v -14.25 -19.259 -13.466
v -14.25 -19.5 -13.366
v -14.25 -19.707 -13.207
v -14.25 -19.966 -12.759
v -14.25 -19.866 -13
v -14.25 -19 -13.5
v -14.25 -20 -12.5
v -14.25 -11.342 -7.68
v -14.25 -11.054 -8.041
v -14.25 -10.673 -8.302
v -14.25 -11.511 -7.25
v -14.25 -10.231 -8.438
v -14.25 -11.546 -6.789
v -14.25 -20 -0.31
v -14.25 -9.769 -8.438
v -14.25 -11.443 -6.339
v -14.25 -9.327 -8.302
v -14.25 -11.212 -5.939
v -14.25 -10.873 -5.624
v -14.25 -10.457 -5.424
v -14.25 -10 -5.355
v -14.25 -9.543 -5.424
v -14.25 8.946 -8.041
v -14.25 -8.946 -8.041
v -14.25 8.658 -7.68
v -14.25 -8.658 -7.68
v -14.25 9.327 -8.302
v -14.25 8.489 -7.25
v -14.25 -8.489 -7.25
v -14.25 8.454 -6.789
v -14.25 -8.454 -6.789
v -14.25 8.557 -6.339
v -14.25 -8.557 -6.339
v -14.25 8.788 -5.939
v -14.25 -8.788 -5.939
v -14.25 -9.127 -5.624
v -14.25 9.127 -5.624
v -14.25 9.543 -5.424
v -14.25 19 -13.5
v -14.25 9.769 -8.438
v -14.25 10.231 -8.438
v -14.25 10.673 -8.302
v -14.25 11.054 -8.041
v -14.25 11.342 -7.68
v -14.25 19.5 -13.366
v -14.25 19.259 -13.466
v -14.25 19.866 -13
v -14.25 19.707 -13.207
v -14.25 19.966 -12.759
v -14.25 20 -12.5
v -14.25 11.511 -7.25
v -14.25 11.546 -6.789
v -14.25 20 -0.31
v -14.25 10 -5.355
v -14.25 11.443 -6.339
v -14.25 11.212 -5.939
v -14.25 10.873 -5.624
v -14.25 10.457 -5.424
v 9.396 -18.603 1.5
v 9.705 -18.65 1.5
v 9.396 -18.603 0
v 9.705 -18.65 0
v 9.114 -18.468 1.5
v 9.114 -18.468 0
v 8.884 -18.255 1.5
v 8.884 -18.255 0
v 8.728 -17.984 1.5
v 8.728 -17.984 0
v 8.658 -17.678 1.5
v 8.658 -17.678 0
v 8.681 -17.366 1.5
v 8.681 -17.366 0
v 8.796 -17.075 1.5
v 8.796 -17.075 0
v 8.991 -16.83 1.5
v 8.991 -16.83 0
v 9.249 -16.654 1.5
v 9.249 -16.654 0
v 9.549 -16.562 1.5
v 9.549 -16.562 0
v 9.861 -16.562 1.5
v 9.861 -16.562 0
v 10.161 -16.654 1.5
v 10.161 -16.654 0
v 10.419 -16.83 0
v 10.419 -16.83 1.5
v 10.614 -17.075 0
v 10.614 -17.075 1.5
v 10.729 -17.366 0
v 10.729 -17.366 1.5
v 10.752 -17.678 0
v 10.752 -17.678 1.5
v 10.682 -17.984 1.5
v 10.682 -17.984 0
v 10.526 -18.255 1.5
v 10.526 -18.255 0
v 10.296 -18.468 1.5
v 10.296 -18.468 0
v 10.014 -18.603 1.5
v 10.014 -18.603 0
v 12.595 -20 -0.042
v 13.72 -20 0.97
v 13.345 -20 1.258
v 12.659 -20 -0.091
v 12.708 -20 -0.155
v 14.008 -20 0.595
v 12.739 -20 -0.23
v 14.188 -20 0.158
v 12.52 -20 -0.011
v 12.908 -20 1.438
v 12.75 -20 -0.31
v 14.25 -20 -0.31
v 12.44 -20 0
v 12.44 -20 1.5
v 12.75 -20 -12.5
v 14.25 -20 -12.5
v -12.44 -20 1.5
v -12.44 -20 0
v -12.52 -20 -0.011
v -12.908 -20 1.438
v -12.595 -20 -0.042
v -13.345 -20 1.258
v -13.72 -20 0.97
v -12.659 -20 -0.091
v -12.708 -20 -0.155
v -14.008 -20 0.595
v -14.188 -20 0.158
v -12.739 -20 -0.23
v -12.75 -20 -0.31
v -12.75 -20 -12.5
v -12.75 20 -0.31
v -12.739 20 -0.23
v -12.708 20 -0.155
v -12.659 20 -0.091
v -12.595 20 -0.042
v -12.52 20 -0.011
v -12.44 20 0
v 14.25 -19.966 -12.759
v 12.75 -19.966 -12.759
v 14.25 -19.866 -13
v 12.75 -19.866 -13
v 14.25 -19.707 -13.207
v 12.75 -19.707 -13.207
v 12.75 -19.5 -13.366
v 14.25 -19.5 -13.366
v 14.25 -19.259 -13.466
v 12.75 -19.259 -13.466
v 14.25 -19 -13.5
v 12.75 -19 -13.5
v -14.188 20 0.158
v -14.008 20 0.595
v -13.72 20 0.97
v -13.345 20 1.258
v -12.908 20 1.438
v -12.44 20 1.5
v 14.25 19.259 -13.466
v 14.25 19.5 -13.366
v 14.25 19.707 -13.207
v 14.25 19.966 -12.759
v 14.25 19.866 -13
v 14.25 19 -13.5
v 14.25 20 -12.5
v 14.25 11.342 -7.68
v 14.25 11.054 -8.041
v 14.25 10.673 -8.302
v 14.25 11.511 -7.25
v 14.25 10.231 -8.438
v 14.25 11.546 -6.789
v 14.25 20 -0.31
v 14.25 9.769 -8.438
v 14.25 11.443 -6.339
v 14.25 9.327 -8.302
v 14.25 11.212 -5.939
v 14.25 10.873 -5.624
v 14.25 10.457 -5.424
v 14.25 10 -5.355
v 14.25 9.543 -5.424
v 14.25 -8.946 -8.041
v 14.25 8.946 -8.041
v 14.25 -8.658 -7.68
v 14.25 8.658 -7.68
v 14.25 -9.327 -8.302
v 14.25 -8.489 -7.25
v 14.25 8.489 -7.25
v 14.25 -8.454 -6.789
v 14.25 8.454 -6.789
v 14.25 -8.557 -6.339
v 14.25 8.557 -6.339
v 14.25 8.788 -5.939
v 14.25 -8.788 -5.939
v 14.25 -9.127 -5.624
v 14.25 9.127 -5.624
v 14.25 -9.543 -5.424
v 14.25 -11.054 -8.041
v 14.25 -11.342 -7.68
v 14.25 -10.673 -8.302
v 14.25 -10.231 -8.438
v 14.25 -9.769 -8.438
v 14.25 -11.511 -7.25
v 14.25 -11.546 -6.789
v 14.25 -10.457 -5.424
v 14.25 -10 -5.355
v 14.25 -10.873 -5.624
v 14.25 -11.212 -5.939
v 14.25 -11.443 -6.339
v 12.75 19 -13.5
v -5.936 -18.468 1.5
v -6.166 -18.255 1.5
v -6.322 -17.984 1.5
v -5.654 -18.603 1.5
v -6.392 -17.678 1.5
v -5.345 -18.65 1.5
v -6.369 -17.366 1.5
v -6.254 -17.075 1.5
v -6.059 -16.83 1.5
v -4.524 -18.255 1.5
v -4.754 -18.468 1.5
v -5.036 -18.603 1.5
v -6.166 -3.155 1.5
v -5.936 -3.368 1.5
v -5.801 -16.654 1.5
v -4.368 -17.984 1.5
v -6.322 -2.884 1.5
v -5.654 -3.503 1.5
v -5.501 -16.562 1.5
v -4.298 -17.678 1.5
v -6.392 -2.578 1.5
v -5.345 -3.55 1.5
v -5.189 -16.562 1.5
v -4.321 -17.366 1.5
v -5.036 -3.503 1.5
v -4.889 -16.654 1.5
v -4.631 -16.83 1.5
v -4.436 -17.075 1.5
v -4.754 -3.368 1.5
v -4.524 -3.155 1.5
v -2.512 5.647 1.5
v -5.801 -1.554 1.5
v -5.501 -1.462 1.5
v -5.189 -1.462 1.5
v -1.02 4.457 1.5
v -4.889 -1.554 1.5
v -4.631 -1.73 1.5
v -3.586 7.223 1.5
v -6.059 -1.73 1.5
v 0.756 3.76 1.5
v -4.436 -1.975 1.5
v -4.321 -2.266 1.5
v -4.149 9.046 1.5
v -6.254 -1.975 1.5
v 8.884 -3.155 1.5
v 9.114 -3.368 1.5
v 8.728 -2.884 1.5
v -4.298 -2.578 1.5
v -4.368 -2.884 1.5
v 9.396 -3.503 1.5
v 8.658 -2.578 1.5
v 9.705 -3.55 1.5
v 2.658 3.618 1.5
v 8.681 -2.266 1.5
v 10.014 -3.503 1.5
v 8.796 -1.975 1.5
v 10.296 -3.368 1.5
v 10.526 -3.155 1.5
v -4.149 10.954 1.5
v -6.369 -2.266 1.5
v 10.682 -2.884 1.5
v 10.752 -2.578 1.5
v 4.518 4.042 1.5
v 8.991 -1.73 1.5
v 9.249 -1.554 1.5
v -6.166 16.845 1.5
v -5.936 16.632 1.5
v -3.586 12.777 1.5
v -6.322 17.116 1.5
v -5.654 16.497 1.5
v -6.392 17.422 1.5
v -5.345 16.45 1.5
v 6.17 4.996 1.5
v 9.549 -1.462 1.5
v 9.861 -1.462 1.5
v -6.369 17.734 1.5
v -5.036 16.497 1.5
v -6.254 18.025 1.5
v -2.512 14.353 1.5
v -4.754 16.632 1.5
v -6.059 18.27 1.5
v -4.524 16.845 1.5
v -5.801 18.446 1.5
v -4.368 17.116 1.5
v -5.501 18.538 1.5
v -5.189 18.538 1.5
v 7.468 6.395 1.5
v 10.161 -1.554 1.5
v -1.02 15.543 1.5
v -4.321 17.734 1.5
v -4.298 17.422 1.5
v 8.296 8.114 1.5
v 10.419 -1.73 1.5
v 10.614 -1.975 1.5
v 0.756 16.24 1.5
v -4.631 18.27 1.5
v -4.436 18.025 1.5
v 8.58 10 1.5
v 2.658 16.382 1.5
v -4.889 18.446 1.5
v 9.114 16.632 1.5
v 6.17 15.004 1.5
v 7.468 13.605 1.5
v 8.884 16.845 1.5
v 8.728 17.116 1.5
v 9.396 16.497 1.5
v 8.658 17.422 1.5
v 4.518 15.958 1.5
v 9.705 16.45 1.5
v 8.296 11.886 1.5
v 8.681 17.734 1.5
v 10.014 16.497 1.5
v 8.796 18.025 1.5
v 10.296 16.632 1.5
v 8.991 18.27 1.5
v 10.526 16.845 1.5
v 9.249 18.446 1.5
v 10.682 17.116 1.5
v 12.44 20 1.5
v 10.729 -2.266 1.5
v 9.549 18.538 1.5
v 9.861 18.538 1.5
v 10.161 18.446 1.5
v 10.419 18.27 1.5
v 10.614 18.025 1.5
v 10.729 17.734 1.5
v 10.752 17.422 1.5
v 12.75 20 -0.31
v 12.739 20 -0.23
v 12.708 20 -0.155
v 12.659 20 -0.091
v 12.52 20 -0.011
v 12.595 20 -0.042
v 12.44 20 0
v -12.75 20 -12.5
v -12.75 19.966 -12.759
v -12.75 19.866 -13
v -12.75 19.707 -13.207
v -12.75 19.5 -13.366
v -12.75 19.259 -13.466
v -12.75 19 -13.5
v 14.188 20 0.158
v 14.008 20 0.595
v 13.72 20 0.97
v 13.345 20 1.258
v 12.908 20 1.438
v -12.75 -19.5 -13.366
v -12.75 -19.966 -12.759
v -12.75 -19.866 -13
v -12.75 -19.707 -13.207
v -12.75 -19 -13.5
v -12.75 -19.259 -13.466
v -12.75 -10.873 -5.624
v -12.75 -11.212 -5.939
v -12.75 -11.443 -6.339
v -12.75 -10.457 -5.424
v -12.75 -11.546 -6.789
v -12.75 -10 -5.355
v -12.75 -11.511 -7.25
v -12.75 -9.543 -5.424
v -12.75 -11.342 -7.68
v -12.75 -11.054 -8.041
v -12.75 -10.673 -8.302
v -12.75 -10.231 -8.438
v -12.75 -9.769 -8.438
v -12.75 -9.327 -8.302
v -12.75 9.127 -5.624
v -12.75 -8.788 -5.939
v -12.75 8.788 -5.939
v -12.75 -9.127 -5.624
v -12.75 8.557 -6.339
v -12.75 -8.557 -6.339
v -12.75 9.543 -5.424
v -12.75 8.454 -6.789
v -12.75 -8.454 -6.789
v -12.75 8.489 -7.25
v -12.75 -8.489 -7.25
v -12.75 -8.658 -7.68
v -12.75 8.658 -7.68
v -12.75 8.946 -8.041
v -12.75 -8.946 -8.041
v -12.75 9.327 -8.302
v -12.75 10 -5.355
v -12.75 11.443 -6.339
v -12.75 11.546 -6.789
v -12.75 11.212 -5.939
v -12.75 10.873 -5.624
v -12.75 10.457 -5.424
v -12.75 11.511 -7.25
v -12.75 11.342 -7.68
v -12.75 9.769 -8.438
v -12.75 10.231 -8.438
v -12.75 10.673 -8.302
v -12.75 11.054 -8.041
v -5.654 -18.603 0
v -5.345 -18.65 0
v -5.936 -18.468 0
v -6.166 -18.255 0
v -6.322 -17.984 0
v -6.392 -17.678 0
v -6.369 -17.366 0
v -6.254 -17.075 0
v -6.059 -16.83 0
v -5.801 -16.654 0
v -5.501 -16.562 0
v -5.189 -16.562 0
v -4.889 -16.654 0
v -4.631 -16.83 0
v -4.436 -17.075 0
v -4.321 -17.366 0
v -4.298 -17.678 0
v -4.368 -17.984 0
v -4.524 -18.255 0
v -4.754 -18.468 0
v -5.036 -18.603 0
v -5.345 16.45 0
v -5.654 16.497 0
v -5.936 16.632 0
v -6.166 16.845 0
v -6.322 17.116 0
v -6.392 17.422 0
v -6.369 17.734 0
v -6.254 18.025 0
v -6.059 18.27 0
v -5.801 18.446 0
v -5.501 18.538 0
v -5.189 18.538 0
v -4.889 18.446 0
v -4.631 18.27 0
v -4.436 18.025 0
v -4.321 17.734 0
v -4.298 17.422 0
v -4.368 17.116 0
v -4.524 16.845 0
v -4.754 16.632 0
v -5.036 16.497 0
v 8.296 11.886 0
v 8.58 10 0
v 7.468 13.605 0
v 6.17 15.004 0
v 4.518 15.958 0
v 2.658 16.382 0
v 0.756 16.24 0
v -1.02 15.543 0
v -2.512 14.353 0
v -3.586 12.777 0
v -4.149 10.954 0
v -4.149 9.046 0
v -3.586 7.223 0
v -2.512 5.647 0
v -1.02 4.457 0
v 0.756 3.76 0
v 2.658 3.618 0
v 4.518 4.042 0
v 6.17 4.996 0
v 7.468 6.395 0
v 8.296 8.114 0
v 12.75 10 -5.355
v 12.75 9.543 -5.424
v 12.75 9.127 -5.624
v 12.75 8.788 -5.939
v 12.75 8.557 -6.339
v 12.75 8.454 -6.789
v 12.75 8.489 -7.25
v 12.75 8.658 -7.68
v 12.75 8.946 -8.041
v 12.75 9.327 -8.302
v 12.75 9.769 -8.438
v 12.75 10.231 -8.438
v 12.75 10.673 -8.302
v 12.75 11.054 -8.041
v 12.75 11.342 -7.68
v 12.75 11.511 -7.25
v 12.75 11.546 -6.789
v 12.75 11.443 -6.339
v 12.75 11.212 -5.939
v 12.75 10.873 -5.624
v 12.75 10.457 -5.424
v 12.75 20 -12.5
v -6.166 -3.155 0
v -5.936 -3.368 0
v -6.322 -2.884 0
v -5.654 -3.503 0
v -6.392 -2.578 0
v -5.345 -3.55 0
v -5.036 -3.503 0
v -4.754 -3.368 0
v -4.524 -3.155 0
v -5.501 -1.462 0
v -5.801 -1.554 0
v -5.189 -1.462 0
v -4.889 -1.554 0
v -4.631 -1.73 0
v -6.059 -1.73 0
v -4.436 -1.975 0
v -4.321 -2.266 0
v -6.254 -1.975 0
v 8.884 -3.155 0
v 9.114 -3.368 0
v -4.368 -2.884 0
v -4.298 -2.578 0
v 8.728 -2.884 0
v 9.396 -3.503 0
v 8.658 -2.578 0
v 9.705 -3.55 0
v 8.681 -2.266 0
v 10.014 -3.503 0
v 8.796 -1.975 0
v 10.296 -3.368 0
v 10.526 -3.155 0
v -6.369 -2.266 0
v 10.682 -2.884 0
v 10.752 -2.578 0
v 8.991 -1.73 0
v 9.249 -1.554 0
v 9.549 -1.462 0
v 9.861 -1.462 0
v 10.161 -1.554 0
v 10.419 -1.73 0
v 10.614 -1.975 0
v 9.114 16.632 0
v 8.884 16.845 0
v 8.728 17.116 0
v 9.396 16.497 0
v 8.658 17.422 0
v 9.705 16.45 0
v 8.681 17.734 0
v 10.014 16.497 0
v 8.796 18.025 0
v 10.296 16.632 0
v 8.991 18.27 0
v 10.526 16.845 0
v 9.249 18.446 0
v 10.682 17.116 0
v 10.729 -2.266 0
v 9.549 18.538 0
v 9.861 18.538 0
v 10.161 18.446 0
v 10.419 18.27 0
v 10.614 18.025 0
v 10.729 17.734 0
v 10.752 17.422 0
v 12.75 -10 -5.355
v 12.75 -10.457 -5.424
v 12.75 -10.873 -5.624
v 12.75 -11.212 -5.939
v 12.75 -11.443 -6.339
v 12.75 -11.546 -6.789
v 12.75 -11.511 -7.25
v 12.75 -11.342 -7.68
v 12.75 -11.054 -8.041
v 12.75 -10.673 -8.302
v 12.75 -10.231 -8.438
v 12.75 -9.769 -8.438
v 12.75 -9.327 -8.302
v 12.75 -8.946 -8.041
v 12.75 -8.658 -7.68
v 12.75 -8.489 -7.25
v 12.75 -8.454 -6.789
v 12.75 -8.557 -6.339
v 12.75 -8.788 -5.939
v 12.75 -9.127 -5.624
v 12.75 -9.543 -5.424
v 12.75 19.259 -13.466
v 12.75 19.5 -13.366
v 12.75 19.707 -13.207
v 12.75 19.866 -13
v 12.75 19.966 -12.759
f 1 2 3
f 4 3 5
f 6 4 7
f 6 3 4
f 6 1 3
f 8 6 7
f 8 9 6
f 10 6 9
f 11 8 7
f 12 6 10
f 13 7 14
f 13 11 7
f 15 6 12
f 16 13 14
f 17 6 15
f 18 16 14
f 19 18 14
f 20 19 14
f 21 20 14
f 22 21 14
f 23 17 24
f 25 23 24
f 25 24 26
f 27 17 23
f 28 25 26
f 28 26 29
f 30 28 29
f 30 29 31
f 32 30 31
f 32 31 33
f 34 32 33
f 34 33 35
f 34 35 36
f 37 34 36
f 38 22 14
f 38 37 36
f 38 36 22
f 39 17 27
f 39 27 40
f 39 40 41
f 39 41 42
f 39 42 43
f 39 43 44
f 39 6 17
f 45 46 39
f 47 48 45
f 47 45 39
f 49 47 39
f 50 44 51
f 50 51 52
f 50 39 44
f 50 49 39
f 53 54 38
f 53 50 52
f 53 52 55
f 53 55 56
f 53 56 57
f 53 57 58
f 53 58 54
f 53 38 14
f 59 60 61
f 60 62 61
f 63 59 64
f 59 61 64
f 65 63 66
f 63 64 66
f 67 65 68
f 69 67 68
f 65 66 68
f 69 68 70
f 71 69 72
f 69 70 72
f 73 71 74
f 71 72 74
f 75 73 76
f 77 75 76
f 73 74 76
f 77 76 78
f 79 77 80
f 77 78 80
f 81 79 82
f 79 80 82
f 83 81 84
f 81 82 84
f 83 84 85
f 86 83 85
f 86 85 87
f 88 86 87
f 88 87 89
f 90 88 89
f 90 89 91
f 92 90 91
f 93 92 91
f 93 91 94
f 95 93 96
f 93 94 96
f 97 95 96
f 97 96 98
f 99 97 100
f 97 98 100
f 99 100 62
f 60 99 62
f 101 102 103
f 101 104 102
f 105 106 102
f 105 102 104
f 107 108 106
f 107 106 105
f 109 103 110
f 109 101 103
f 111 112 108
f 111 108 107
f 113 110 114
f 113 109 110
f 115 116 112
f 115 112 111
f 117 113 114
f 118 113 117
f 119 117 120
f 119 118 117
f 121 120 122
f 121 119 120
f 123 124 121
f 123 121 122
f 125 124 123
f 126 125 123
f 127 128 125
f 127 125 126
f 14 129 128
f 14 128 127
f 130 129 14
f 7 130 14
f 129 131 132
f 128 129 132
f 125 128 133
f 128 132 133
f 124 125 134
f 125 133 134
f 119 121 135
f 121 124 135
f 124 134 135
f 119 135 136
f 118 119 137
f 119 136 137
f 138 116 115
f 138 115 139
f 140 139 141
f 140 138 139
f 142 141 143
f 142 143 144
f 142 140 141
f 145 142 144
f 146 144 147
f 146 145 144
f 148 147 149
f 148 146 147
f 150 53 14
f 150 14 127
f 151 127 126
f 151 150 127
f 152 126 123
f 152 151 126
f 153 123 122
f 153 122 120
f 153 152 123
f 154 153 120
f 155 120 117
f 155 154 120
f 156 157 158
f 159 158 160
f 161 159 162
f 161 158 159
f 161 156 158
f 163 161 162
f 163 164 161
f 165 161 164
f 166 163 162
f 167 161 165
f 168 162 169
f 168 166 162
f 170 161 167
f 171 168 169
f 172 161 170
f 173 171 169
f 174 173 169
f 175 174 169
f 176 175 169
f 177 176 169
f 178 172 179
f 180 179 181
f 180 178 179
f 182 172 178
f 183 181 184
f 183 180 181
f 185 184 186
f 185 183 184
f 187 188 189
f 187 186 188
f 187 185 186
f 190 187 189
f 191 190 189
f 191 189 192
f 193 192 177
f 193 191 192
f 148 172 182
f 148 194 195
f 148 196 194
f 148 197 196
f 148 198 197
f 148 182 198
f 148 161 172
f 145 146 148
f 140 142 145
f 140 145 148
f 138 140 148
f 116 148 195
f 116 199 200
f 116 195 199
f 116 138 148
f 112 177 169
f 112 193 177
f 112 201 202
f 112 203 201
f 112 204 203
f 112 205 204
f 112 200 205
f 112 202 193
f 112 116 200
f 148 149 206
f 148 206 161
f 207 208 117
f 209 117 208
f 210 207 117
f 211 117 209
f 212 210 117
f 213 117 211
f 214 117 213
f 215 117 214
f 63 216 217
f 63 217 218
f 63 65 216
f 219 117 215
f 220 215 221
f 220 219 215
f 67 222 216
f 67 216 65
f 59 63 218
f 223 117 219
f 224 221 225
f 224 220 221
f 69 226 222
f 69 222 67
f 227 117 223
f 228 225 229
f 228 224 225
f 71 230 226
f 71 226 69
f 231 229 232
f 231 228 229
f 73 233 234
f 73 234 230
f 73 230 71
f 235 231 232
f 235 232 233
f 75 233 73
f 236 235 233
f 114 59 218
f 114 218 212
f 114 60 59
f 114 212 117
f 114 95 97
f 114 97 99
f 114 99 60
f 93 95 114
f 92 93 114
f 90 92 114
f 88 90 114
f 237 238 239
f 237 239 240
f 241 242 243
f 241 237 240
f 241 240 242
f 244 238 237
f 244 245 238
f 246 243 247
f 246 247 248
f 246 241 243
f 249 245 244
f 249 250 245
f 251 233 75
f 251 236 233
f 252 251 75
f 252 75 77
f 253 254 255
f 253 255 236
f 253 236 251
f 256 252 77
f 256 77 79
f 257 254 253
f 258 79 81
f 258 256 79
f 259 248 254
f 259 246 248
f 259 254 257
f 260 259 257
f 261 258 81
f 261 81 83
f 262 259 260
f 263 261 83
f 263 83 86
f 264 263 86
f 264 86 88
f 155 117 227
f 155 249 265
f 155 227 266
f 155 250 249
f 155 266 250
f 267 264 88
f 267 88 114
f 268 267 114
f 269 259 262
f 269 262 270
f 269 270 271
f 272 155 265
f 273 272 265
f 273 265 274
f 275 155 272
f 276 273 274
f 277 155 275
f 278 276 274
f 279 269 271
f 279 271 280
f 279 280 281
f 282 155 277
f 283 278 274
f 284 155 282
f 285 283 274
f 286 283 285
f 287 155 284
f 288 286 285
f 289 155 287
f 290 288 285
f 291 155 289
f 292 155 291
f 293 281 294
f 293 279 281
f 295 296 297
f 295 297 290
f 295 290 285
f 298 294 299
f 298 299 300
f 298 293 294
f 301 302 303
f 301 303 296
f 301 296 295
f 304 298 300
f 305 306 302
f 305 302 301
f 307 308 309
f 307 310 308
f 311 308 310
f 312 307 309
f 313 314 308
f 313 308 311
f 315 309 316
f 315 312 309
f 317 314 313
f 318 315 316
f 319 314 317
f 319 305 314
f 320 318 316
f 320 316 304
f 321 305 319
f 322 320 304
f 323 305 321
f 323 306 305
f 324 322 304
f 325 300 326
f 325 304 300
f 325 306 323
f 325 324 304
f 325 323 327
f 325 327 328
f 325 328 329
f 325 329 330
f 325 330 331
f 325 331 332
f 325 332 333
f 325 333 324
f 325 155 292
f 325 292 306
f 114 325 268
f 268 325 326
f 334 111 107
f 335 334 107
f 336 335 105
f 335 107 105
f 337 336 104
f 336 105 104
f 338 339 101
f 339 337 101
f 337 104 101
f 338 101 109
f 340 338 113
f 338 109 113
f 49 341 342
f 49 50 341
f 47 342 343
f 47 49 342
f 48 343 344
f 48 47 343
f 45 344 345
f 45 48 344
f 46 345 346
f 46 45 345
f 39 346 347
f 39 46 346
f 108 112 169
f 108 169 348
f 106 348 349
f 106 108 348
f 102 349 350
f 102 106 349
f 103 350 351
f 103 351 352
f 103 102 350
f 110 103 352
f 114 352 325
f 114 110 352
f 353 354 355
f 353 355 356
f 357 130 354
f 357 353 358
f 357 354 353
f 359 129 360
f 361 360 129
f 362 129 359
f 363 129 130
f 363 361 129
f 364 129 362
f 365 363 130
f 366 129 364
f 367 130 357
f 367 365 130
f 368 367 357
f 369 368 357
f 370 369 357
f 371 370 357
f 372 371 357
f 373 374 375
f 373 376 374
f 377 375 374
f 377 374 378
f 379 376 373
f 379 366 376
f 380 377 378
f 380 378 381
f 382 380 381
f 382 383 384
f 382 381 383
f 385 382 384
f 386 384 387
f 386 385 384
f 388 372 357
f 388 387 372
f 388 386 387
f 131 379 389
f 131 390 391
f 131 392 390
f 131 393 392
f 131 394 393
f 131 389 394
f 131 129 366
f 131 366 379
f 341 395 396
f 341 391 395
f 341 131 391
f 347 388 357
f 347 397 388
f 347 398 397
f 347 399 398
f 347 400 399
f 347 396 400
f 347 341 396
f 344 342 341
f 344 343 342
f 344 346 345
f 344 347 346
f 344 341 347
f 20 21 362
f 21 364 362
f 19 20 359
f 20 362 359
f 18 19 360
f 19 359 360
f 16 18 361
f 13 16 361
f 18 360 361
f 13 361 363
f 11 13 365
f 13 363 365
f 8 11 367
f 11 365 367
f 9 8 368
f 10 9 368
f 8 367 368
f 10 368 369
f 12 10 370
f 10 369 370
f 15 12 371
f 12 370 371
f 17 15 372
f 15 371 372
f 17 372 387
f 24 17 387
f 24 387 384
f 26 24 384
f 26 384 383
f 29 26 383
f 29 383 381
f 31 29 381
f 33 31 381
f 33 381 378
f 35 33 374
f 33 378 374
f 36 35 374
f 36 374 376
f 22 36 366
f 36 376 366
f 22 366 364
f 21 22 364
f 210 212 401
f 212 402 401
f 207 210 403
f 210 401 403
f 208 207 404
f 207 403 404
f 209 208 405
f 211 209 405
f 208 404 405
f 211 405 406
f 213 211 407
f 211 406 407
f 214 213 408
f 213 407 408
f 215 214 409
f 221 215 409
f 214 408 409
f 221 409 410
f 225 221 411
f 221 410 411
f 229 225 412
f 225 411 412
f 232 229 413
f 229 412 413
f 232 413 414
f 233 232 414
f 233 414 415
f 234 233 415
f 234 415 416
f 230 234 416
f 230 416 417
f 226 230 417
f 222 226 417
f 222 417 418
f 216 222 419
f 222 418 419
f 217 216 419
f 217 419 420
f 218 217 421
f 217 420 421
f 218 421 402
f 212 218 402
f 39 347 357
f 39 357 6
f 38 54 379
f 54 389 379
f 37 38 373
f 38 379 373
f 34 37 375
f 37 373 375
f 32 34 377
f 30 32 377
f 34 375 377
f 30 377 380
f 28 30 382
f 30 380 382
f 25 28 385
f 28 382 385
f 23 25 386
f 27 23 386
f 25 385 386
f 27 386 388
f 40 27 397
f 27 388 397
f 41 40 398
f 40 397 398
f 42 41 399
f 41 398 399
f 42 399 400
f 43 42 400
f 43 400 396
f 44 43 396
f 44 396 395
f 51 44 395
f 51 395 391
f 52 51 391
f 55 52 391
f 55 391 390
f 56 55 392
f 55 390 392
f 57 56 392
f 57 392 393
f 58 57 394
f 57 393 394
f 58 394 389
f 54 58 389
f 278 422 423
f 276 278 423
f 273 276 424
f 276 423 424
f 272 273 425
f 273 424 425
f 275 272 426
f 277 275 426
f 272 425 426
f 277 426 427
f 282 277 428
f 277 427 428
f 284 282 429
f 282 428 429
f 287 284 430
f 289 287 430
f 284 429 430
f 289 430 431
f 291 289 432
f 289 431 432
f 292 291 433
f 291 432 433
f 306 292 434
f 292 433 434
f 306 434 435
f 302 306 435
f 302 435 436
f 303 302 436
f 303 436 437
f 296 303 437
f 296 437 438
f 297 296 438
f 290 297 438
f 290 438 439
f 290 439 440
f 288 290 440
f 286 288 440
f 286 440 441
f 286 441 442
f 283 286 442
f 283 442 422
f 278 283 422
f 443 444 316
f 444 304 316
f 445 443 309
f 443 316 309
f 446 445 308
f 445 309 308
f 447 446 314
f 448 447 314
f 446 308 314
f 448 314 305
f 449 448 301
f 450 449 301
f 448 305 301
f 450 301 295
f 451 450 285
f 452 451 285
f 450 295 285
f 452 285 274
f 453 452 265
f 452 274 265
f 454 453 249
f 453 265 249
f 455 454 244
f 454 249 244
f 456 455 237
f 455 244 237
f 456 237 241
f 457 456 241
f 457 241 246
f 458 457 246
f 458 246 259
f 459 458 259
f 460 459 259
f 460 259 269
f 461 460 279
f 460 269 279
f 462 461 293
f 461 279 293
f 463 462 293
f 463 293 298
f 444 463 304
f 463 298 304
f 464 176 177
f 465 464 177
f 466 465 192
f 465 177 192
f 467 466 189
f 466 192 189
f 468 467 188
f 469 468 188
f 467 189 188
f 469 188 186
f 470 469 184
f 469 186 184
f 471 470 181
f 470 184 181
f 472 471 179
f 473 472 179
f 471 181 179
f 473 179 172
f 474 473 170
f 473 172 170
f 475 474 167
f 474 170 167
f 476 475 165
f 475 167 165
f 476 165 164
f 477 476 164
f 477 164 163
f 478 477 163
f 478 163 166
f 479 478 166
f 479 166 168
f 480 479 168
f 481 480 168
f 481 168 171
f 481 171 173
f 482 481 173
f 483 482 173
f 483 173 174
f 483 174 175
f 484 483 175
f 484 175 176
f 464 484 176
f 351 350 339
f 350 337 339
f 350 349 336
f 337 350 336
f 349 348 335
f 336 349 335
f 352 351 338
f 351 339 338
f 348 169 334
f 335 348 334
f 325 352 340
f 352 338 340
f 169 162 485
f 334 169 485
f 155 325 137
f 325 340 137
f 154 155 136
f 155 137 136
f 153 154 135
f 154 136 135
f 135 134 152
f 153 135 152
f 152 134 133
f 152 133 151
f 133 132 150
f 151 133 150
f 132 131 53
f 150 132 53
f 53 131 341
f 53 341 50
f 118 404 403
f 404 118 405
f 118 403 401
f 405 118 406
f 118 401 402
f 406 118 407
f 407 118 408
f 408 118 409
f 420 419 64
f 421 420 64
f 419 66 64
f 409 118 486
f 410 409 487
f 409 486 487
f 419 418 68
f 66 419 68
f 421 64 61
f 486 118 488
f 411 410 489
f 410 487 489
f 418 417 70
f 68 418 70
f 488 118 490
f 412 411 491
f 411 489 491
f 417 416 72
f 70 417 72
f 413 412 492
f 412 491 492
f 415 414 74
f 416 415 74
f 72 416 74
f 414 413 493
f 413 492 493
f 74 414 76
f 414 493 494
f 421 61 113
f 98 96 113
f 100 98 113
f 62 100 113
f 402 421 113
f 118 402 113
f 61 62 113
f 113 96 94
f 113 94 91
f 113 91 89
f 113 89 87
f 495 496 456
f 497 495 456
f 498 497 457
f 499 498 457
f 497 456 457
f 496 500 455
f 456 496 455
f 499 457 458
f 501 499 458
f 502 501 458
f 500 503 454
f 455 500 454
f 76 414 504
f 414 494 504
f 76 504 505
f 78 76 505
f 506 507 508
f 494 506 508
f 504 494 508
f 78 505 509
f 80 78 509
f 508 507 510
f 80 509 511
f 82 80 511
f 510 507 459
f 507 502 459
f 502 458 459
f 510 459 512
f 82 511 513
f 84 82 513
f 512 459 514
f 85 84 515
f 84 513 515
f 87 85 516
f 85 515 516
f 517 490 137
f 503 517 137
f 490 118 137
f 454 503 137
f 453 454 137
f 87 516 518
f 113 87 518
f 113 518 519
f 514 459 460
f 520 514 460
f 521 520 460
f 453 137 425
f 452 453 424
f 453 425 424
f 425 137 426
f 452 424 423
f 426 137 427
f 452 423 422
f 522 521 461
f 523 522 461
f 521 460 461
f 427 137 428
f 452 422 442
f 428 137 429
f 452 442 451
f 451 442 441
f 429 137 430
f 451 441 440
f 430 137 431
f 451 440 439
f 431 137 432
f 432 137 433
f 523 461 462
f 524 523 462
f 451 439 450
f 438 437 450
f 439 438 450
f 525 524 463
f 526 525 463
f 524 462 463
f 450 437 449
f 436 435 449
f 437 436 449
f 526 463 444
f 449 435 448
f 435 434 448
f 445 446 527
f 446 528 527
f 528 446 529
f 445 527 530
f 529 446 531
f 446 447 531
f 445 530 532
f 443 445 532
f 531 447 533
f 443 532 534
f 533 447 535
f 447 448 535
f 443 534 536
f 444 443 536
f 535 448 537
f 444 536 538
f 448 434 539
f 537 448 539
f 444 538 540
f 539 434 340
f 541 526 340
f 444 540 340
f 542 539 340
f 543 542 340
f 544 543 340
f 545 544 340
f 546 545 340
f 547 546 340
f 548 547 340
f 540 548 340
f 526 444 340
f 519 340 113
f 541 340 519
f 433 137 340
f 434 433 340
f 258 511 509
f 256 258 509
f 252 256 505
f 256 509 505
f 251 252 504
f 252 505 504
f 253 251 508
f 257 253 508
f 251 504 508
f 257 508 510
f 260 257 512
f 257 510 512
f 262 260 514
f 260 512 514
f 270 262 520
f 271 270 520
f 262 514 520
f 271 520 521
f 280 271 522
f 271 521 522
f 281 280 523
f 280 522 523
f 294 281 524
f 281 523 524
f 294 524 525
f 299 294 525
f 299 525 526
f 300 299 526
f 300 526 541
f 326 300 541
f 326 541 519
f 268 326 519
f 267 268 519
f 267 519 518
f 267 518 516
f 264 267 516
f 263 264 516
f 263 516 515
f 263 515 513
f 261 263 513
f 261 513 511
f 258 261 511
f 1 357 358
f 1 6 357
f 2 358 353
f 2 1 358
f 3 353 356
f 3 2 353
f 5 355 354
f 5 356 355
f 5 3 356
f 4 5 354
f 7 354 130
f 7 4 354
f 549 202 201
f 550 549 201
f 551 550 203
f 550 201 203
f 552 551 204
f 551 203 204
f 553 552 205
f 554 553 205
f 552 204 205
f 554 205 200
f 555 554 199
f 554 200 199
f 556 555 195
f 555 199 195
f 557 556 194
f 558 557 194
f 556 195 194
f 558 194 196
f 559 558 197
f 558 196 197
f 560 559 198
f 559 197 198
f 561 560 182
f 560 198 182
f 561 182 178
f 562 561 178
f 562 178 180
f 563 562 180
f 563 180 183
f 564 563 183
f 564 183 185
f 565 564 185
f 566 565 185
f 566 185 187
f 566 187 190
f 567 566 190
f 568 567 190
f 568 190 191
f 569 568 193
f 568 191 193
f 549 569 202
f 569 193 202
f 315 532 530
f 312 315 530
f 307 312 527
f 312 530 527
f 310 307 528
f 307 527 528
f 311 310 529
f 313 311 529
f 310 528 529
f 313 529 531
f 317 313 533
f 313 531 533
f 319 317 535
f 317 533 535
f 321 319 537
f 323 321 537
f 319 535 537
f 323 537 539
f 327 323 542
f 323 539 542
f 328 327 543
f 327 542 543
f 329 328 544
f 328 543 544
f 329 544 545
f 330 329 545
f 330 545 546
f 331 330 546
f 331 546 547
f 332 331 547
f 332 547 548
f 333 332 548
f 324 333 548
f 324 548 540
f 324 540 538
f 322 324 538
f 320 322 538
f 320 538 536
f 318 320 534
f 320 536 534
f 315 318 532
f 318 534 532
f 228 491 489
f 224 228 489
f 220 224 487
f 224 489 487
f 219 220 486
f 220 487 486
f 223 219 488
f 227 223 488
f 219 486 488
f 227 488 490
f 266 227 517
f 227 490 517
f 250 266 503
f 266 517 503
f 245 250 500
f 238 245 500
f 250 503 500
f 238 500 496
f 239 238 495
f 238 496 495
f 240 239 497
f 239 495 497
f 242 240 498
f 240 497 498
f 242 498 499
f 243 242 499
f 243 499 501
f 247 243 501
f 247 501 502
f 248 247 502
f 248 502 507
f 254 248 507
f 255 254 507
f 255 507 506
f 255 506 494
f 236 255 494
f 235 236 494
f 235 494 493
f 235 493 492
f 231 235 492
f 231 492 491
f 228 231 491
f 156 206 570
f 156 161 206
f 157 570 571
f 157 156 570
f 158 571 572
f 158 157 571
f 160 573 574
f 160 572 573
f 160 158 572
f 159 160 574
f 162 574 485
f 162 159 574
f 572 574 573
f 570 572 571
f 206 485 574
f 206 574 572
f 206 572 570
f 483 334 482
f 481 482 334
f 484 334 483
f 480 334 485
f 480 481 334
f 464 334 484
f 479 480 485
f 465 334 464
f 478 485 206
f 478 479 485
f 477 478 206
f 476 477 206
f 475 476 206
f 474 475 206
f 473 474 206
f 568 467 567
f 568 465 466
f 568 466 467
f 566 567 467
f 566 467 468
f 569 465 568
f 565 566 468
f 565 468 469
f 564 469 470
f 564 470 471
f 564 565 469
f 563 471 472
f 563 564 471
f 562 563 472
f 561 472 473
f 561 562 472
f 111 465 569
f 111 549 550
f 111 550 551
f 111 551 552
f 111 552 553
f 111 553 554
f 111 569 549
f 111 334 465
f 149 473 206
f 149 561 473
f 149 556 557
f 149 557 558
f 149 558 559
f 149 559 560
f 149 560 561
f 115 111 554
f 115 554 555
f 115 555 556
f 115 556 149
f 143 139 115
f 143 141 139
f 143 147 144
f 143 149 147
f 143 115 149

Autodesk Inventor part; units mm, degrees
ref_plane "YZ Plane" through (0, 0, 0) normal (1, 0, 0) x (0, 1, 0)
ref_plane "XZ Plane" through (0, 0, 0) normal (0, 1, 0) x (-1, 0, 0)
ref_plane "XY Plane" through (0, 0, 0) normal (0, 0, 1) x (1, 0, 0)
sketch "Sketch1" plane through (0, 0, 0) normal (0, 0, 1) x (1, 0, 0)
  line L0 (-14.25, -20) -> (14.25, -20)
  line L1 (14.25, -20) -> (14.25, 20)
  line L2 (14.25, 20) -> (-14.25, 20)
  line L3 (-14.25, 20) -> (-14.25, -20)
  line L4 (-14.25, -20) -> (14.25, 20) construction
  line L5 (14.25, -20) -> (-14.25, 20) construction
  point P0 (0, 0)
  dimension "d0" = 28.5
  dimension "d1" = 40
extrude "Plate1" add sketch "Sketch1" along normal blind 1.5
sketch "Sketch2" plane through (12.75, -20, 1.5) normal (1, 0, 0) x (0, 1, 0)
  line L0 (40, 0) -> (0, 0)
  line L1 (0, 0) -> (0, -15)
  line L2 (0, -15) -> (40, -15)
  line L3 (40, -15) -> (40, 0)
edge flange "Flange1" height 15 angle 90 thickness 1.5 bend radius 0.31 thickness toward (1, 0, 0) relief tear relief width 1.5 relief depth 0.75 corner gap 0.31 corner form 0 edges at (14.25, 0, 0) (-14.25, 0, 0) wall of the first edge with corners at (12.75, 20, 1.5) (12.75, -20, 1.5) (12.75, -20, -13.5) (12.75, 20, -13.5)
bend "Bend1"
corner "Corner1"
sketch "Sketch3" plane through (0, 0, 1.5) normal (0, 0, 1) x (1, 0, 0)
  ellipse E0 centre (-5.772, 17.882) end of major axis (-6.638, 18.748) minor radius 1 (-5.9956, 19) -> (-6.89, 18.1056) ccw projected
  line L0 (10.3556, 19) -> (-5.9956, 19) projected
  ellipse E1 centre (10.132, 17.882) end of major axis (10.998, 18.748) minor radius 1 (11.25, 18.1056) -> (10.3556, 19) ccw projected
  line L1 (11.25, -18.2056) -> (11.25, 18.1056) projected
  ellipse E2 centre (10.132, -17.982) end of major axis (10.998, -18.848) minor radius 1 (10.3556, -19.1) -> (11.25, -18.2056) ccw projected
  line L2 (-5.9956, -19.1) -> (10.3556, -19.1) projected
  ellipse E3 centre (-5.772, -17.982) end of major axis (-6.638, -18.848) minor radius 1 (-6.89, -18.2056) -> (-5.9956, -19.1) ccw projected
  line L3 (-6.89, 18.1056) -> (-6.89, -18.2056) projected
  circle A0 centre (9.705, -17.6) radius 0.7835 projected
  circle A1 centre (-5.345, -17.6) radius 0.7835 projected
  circle A2 centre (9.705, -2.5) radius 0.7835 projected
  circle A3 centre (-5.345, -2.5) radius 0.7835 projected
  circle A4 centre (9.705, 17.5) radius 0.7835 projected
  circle A5 centre (-5.345, 17.5) radius 0.7835 projected
  circle A6 centre (2.18, 10) radius 6.4 projected
  point P0 (0, 0)
hole "Hole1" at (-5.345, -17.6, 1.5) at (9.705, -17.6, 1.5) at (9.705, -2.5, 1.5) at (-5.345, -2.5, 1.5) at (-5.345, 17.5, 1.5) at (9.705, 17.5, 1.5) direction (0, 0, -1) diameter 2.1 depth 1.5
sketch "Sketch4" plane through (0, 0, 1.5) normal (0, 0, 1) x (1, 0, 0)
  ellipse E0 centre (-5.772, 17.882) end of major axis (-6.638, 18.748) minor radius 1 (-5.9956, 19) -> (-6.89, 18.1056) ccw projected
  line L0 (10.3556, 19) -> (-5.9956, 19) projected
  ellipse E1 centre (10.132, 17.882) end of major axis (10.998, 18.748) minor radius 1 (11.25, 18.1056) -> (10.3556, 19) ccw projected
  line L1 (11.25, -18.2056) -> (11.25, 18.1056) projected
  ellipse E2 centre (10.132, -17.982) end of major axis (10.998, -18.848) minor radius 1 (10.3556, -19.1) -> (11.25, -18.2056) ccw projected
  line L2 (-5.9956, -19.1) -> (10.3556, -19.1) projected
  ellipse E3 centre (-5.772, -17.982) end of major axis (-6.638, -18.848) minor radius 1 (-6.89, -18.2056) -> (-5.9956, -19.1) ccw projected
  line L3 (-6.89, 18.1056) -> (-6.89, -18.2056) projected
  circle A0 centre (9.705, -17.6) radius 0.7835 projected
  circle A1 centre (-5.345, -17.6) radius 0.7835 projected
  circle A2 centre (9.705, -2.5) radius 0.7835 projected
  circle A3 centre (-5.345, -2.5) radius 0.7835 projected
  circle A4 centre (9.705, 17.5) radius 0.7835 projected
  circle A5 centre (-5.345, 17.5) radius 0.7835 projected
  circle A6 centre (2.18, 10) radius 6.4 projected
  point P0 (0, 0)
extrude "Extrusion1" cut sketch "Sketch4" against normal blind 1.5 contours A6
fillet "Corner Round1" radius 1 4 edges at (13.5, 20, -13.5) (13.5, -20, -13.5) (-13.5, 20, -13.5) (-13.5, -20, -13.5)
sketch "Sketch5" plane through (-14.25, -20, -0.31) normal (-1, 0, 0) x (0, 0, 1)
  line L0 (-6.595, 40) -> (-6.595, 0)
  line L1 (-12.19, 40) -> (0, 40) projected
  line L2 (0, 0) -> (0, 40) projected
  circle A0 centre (-6.595, 30) radius 1.55
  circle A1 centre (-6.595, 10) radius 1.55
  line L3 (0, 0) -> (-12.19, 0) projected
  point P0 (0.31, 20)
  dimension "d23" = 40
  dimension "d24" = 6.595
  dimension "d25" = 3.1
  dimension "d26" = 3.1
  dimension "d27" = 10
  dimension "d28" = 10
hole "Hole2" at (-14.25, 10, -6.905) at (-14.25, -10, -6.905) direction (1, 0, 0) diameter 3.1 end through all
equation "\"d18\" = Thickness"
equation "\"d34\" = Thickness"
equation "\"d2\" = Thickness"
equation "\"d3\" = BendReliefWidth"
equation "\"d4\" = BendReliefDepth"
equation "\"d5\" = MinimumRemnant"
equation "\"d6\" = TransitionRadius"
equation "\"d9\" = BendRadius"
equation "\"d10\" = CornerReliefSize"
equation "\"d11\" = GapSize"
equation "\"d12\" = JacobiRadiusSize"
equation "\"BendReliefWidth\" = Thickness"
equation "\"BendReliefDepth\" = 0.5 * Thickness"
equation "\"CornerReliefSize\" = 4 * Thickness"
equation "\"MinimumRemnant\" = 2 * Thickness"
equation "\"TransitionRadius\" = BendRadius"
equation "\"JacobiRadiusSize\" = BendRadius"
equation "\"GapSize\" = Thickness"
equation "\"Thickness\" = 1.5"
equation "\"BendRadius\" = 0.31"
properties part number "body_motor_L_frame" material "Aluminum 6061-AHC"
